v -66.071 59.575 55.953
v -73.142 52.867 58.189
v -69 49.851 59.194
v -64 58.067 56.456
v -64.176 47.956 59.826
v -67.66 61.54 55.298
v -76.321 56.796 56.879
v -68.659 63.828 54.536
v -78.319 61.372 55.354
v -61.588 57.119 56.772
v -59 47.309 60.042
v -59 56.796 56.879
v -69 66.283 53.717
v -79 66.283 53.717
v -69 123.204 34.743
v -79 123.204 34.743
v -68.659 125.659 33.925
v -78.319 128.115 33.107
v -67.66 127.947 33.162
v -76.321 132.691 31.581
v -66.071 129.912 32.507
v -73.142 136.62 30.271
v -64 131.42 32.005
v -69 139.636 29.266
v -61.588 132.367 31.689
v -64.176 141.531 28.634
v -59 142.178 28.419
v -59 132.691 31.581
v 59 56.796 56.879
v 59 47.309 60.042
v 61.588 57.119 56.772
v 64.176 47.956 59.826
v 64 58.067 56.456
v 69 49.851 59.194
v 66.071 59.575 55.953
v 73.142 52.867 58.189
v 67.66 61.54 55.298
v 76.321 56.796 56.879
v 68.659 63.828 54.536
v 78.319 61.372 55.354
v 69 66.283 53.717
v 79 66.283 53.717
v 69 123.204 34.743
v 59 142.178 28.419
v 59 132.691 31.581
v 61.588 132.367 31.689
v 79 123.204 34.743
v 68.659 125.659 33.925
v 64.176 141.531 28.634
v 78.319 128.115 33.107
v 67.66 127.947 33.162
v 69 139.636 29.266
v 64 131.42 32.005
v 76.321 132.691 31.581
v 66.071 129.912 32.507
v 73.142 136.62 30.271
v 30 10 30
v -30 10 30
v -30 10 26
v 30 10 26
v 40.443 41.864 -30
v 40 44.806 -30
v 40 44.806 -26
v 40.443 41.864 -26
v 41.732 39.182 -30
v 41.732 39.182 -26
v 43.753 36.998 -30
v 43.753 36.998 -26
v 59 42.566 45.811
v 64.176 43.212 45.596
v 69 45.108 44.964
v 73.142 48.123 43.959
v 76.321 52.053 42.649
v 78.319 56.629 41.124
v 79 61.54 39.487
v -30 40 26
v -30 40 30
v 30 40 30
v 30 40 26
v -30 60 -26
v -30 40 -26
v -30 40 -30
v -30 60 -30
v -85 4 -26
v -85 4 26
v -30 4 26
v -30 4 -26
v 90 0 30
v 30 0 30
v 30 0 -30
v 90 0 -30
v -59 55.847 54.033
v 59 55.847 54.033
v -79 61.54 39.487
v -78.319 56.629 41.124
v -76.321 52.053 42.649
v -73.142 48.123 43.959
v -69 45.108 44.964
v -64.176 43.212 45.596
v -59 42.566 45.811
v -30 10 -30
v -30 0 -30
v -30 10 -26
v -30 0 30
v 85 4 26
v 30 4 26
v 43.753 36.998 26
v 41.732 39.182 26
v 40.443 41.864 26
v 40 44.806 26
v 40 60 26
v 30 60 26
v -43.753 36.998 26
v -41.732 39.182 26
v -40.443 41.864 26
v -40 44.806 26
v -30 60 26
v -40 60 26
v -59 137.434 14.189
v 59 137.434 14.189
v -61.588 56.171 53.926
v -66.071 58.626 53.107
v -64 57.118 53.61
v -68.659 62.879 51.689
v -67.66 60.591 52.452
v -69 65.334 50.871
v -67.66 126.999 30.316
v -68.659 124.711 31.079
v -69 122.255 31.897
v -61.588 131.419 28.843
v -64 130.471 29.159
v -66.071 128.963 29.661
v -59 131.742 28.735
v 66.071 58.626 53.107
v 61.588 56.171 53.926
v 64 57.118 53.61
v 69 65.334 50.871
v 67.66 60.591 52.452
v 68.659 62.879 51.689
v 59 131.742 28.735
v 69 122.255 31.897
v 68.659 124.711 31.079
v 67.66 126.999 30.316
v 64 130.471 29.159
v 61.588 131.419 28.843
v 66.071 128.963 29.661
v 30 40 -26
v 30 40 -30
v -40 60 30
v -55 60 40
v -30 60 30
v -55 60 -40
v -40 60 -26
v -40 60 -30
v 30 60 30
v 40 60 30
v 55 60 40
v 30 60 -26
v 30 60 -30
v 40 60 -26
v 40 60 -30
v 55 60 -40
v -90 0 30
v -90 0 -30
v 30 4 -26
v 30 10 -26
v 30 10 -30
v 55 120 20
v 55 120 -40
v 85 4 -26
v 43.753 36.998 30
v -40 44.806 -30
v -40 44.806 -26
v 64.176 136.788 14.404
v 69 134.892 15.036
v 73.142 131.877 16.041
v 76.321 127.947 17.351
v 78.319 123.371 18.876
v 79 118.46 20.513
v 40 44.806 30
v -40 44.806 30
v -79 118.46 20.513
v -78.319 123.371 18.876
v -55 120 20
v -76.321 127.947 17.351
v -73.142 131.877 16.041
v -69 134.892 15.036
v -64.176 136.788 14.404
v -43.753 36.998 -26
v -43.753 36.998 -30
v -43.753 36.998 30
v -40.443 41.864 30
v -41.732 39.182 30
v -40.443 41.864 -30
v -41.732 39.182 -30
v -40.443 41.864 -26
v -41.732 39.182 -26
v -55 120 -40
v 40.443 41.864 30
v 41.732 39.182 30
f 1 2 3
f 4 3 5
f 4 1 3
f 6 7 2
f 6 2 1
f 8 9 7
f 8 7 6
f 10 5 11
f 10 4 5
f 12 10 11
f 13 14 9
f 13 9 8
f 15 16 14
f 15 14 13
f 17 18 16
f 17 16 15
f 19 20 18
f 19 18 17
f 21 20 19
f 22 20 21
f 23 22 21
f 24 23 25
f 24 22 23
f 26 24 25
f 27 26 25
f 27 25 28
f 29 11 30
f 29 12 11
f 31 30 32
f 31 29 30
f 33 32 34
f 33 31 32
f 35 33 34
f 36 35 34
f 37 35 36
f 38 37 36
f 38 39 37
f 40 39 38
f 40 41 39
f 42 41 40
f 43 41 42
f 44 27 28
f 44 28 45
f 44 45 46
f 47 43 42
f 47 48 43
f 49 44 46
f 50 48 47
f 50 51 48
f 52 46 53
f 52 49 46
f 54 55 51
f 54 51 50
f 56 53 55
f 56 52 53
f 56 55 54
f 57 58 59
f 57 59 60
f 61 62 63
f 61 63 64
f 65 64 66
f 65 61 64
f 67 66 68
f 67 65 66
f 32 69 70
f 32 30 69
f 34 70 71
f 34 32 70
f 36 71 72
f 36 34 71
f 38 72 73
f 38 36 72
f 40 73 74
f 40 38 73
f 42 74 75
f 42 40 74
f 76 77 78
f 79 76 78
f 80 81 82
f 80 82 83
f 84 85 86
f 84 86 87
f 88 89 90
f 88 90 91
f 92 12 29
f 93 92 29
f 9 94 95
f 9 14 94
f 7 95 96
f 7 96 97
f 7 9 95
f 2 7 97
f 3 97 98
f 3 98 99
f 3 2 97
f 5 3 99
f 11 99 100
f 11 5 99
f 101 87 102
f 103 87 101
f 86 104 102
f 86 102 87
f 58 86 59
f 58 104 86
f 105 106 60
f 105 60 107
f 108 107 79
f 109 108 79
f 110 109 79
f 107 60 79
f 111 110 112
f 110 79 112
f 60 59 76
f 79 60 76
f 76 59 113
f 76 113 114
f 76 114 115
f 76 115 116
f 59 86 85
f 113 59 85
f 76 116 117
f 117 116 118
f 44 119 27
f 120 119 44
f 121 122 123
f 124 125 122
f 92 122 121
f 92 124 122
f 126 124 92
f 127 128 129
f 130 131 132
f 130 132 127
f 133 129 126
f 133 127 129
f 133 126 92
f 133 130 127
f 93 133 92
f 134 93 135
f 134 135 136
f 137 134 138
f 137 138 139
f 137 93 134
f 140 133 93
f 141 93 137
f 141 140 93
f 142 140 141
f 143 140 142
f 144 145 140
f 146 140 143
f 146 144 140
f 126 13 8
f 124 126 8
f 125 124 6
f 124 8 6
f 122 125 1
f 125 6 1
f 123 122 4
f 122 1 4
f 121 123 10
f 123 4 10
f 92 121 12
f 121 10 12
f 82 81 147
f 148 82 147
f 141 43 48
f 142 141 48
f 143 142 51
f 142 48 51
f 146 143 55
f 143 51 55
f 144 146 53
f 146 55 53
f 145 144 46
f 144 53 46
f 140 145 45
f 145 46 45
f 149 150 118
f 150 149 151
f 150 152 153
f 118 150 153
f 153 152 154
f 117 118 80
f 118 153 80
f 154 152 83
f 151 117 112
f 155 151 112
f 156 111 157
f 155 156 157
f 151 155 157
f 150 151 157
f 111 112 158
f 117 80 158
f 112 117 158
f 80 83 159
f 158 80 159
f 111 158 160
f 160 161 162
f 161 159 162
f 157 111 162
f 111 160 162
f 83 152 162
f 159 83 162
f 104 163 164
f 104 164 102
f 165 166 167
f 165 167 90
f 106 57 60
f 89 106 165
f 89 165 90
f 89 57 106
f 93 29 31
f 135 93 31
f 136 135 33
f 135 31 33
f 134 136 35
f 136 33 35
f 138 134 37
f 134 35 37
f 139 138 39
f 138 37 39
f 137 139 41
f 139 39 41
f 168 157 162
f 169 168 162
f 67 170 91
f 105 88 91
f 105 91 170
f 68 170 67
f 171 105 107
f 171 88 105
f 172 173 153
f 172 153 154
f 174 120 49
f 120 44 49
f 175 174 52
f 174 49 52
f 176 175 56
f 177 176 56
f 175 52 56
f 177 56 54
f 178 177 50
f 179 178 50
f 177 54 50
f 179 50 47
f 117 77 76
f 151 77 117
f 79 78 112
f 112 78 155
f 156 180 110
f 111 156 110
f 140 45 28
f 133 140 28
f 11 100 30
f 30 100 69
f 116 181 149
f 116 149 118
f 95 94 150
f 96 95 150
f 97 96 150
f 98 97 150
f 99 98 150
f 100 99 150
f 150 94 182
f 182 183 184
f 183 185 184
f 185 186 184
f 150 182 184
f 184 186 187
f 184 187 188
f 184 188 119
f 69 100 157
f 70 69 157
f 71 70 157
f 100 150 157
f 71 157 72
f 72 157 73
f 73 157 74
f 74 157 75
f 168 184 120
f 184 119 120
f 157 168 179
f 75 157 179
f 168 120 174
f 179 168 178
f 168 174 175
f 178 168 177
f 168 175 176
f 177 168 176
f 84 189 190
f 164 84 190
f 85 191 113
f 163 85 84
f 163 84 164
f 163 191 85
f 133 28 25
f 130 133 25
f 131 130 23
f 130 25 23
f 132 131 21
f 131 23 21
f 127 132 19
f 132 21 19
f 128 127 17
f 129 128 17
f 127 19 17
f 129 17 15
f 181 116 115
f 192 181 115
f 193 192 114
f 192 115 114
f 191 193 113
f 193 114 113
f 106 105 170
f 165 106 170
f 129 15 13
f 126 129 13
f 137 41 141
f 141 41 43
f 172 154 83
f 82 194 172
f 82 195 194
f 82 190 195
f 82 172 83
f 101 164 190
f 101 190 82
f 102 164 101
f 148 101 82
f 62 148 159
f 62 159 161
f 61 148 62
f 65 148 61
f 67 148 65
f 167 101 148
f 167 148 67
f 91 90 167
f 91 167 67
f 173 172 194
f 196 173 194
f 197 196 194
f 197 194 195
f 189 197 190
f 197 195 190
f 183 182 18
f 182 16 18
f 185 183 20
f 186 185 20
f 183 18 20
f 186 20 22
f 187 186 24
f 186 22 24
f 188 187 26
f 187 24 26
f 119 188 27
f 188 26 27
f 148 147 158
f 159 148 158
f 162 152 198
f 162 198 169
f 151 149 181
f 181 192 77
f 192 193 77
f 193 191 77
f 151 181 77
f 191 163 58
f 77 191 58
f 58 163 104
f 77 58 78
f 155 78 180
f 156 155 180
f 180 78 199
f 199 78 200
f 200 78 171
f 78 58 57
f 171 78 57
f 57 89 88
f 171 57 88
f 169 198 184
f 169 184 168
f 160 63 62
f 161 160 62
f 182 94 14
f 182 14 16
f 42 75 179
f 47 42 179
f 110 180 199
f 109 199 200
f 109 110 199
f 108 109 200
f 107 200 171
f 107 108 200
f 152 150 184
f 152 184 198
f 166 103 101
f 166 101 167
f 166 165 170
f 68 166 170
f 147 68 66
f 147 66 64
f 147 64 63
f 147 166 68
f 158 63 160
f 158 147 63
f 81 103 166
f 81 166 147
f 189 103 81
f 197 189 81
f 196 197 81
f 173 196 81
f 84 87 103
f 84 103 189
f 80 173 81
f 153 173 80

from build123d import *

# Parameters (mm, degrees)
EXTRUDE_1_DEPTH          = 30
SKETCH_2_W               = 80
SKETCH_2_H               = 60
EXTRUDE_2_DEPTH          = 20
FILLET_1_R               = 10
SKETCH_3_W               = 60
SKETCH_3_H               = 20
CUT_EXTRUDE_1_DEPTH      = 124.693168769
SKETCH_4_W               = 110
SKETCH_4_H               = 80
EXTRUDE_3_DEPTH          = 60
CUT_EXTRUDE_2_DEPTH      = 193.418814049
SKETCH_6_W               = 158
SKETCH_6_H               = 100
SKETCH_6_W_2             = 110
SKETCH_6_H_2             = 63.245553204
EXTRUDE_4_DEPTH          = 15
FILLET_2_R               = 20
CUT_EXTRUDE_3_DEPTH      = 3
CUT_EXTRUDE_4_DEPTH      = 212.765112606
CUT_EXTRUDE_4_DEPTH_BACK = 212.765112606
SKETCH_8_W               = 52
SKETCH_8_H               = 56


with BuildPart() as part:
    # 草图1 → 凸台-拉伸1 (new, symmetric)
    with BuildSketch(Plane.XY):
        Polygon((-40, 40), (-90, 0), (-30, 0), (-30, 10), (30, 10), (30, 0), (90, 0), (40, 40), align=None)
    extrude(amount=EXTRUDE_1_DEPTH, both=True)

    # 草图2 → 凸台-拉伸2 (add)
    with BuildSketch(Plane(origin=(0, 40, 0), x_dir=(1, 0, 0), z_dir=(0, 1, 0))):
        Rectangle(SKETCH_2_W, SKETCH_2_H)
    extrude(amount=EXTRUDE_2_DEPTH)

    # 圆角1
    fillet_1_edges = [part.edges().sort_by_distance(p)[0] for p in [
        (40, 40, 0),
        (-40, 40, 0),
    ]]
    fillet(fillet_1_edges, radius=FILLET_1_R)

    # 草图3 → 切除-拉伸1 (cut, through all)
    with BuildSketch(Plane.XY.offset(30)):
        with Locations((0, 50)):
            Rectangle(SKETCH_3_W, SKETCH_3_H)
    extrude(amount=-CUT_EXTRUDE_1_DEPTH, mode=Mode.SUBTRACT)

    # 草图4 → 凸台-拉伸3 (add)
    with BuildSketch(Plane(origin=(0, 60, 0), x_dir=(1, 0, 0), z_dir=(0, 1, 0))):
        Rectangle(SKETCH_4_W, SKETCH_4_H)
    extrude(amount=EXTRUDE_3_DEPTH)

    # 草图5 → 切除-拉伸2 (cut, through all)
    with BuildSketch(Plane.ZY.offset(55)):
        Polygon((20, 120), (40, 60), (40, 120), align=None)
    extrude(amount=-CUT_EXTRUDE_2_DEPTH, mode=Mode.SUBTRACT)

    # 草图6 → 凸台-拉伸4 (add)
    # profile 1 of 2: a face of its own
    with BuildSketch(Plane(origin=(0, 18, 54), x_dir=(1, 0, 0), z_dir=(0, 0.31622776601683805, 0.9486832980505138))):
        with Locations((0, 75.894663844)):
            Rectangle(SKETCH_6_W, SKETCH_6_H)
        with Locations((0, 75.894663844)):
            Rectangle(SKETCH_6_W_2, SKETCH_6_H_2, mode=Mode.SUBTRACT)
    # profile 2 of 2: a face of its own
    with BuildSketch(Plane(origin=(0, 18, 54), x_dir=(1, 0, 0), z_dir=(0, 0.31622776601683805, 0.9486832980505138))):
        with Locations((0, 75.894663844)):
            Rectangle(SKETCH_6_W_2, SKETCH_6_H_2)
    extrude(amount=EXTRUDE_4_DEPTH)

    # 圆角2
    fillet_2_edges = [part.edges().sort_by_distance(p)[0] for p in [
        (-79, 44.937543343, 52.926513036),
        (79, 44.937543343, 52.926513036),
        (79, 139.805873148, 21.303736435),
        (-79, 139.805873148, 21.303736435),
    ]]
    fillet(fillet_2_edges, radius=FILLET_2_R)

    # 草图7 → 切除-拉伸3 (cut)
    with BuildSketch(Plane(origin=(0, 22.74341649, 68.230249471), x_dir=(1, 0, 0), z_dir=(0, 0.3162277660168381, 0.9486832980505138))):
        with BuildLine():
            Line((69, 45.894663844), (69, 105.894663844))
            ThreePointArc((69, 105.894663844), (66.071067812, 112.965731656), (59, 115.894663844))
            Line((59, 115.894663844), (-59, 115.894663844))
            ThreePointArc((-59, 115.894663844), (-66.071067812, 112.965731656), (-69, 105.894663844))
            Line((-69, 105.894663844), (-69, 45.894663844))
            ThreePointArc((-69, 45.894663844), (-66.071067812, 38.823596032), (-59, 35.894663844))
            Line((-59, 35.894663844), (59, 35.894663844))
            ThreePointArc((59, 35.894663844), (66.071067812, 38.823596032), (69, 45.894663844))
        make_face()
    extrude(amount=-CUT_EXTRUDE_3_DEPTH, mode=Mode.SUBTRACT)

    # 草图8 → 切除-拉伸4 (cut, two sides: drawn at the far end of the back side and taken through both)
    with BuildSketch(Plane(origin=(55, 0, 0), x_dir=(0, 0, -1), z_dir=(1, 0, 0)).offset(-CUT_EXTRUDE_4_DEPTH_BACK)):
        with Locations((0, 32)):
            Rectangle(SKETCH_8_W, SKETCH_8_H)
    extrude(amount=CUT_EXTRUDE_4_DEPTH + CUT_EXTRUDE_4_DEPTH_BACK, mode=Mode.SUBTRACT)


solid = part.part
